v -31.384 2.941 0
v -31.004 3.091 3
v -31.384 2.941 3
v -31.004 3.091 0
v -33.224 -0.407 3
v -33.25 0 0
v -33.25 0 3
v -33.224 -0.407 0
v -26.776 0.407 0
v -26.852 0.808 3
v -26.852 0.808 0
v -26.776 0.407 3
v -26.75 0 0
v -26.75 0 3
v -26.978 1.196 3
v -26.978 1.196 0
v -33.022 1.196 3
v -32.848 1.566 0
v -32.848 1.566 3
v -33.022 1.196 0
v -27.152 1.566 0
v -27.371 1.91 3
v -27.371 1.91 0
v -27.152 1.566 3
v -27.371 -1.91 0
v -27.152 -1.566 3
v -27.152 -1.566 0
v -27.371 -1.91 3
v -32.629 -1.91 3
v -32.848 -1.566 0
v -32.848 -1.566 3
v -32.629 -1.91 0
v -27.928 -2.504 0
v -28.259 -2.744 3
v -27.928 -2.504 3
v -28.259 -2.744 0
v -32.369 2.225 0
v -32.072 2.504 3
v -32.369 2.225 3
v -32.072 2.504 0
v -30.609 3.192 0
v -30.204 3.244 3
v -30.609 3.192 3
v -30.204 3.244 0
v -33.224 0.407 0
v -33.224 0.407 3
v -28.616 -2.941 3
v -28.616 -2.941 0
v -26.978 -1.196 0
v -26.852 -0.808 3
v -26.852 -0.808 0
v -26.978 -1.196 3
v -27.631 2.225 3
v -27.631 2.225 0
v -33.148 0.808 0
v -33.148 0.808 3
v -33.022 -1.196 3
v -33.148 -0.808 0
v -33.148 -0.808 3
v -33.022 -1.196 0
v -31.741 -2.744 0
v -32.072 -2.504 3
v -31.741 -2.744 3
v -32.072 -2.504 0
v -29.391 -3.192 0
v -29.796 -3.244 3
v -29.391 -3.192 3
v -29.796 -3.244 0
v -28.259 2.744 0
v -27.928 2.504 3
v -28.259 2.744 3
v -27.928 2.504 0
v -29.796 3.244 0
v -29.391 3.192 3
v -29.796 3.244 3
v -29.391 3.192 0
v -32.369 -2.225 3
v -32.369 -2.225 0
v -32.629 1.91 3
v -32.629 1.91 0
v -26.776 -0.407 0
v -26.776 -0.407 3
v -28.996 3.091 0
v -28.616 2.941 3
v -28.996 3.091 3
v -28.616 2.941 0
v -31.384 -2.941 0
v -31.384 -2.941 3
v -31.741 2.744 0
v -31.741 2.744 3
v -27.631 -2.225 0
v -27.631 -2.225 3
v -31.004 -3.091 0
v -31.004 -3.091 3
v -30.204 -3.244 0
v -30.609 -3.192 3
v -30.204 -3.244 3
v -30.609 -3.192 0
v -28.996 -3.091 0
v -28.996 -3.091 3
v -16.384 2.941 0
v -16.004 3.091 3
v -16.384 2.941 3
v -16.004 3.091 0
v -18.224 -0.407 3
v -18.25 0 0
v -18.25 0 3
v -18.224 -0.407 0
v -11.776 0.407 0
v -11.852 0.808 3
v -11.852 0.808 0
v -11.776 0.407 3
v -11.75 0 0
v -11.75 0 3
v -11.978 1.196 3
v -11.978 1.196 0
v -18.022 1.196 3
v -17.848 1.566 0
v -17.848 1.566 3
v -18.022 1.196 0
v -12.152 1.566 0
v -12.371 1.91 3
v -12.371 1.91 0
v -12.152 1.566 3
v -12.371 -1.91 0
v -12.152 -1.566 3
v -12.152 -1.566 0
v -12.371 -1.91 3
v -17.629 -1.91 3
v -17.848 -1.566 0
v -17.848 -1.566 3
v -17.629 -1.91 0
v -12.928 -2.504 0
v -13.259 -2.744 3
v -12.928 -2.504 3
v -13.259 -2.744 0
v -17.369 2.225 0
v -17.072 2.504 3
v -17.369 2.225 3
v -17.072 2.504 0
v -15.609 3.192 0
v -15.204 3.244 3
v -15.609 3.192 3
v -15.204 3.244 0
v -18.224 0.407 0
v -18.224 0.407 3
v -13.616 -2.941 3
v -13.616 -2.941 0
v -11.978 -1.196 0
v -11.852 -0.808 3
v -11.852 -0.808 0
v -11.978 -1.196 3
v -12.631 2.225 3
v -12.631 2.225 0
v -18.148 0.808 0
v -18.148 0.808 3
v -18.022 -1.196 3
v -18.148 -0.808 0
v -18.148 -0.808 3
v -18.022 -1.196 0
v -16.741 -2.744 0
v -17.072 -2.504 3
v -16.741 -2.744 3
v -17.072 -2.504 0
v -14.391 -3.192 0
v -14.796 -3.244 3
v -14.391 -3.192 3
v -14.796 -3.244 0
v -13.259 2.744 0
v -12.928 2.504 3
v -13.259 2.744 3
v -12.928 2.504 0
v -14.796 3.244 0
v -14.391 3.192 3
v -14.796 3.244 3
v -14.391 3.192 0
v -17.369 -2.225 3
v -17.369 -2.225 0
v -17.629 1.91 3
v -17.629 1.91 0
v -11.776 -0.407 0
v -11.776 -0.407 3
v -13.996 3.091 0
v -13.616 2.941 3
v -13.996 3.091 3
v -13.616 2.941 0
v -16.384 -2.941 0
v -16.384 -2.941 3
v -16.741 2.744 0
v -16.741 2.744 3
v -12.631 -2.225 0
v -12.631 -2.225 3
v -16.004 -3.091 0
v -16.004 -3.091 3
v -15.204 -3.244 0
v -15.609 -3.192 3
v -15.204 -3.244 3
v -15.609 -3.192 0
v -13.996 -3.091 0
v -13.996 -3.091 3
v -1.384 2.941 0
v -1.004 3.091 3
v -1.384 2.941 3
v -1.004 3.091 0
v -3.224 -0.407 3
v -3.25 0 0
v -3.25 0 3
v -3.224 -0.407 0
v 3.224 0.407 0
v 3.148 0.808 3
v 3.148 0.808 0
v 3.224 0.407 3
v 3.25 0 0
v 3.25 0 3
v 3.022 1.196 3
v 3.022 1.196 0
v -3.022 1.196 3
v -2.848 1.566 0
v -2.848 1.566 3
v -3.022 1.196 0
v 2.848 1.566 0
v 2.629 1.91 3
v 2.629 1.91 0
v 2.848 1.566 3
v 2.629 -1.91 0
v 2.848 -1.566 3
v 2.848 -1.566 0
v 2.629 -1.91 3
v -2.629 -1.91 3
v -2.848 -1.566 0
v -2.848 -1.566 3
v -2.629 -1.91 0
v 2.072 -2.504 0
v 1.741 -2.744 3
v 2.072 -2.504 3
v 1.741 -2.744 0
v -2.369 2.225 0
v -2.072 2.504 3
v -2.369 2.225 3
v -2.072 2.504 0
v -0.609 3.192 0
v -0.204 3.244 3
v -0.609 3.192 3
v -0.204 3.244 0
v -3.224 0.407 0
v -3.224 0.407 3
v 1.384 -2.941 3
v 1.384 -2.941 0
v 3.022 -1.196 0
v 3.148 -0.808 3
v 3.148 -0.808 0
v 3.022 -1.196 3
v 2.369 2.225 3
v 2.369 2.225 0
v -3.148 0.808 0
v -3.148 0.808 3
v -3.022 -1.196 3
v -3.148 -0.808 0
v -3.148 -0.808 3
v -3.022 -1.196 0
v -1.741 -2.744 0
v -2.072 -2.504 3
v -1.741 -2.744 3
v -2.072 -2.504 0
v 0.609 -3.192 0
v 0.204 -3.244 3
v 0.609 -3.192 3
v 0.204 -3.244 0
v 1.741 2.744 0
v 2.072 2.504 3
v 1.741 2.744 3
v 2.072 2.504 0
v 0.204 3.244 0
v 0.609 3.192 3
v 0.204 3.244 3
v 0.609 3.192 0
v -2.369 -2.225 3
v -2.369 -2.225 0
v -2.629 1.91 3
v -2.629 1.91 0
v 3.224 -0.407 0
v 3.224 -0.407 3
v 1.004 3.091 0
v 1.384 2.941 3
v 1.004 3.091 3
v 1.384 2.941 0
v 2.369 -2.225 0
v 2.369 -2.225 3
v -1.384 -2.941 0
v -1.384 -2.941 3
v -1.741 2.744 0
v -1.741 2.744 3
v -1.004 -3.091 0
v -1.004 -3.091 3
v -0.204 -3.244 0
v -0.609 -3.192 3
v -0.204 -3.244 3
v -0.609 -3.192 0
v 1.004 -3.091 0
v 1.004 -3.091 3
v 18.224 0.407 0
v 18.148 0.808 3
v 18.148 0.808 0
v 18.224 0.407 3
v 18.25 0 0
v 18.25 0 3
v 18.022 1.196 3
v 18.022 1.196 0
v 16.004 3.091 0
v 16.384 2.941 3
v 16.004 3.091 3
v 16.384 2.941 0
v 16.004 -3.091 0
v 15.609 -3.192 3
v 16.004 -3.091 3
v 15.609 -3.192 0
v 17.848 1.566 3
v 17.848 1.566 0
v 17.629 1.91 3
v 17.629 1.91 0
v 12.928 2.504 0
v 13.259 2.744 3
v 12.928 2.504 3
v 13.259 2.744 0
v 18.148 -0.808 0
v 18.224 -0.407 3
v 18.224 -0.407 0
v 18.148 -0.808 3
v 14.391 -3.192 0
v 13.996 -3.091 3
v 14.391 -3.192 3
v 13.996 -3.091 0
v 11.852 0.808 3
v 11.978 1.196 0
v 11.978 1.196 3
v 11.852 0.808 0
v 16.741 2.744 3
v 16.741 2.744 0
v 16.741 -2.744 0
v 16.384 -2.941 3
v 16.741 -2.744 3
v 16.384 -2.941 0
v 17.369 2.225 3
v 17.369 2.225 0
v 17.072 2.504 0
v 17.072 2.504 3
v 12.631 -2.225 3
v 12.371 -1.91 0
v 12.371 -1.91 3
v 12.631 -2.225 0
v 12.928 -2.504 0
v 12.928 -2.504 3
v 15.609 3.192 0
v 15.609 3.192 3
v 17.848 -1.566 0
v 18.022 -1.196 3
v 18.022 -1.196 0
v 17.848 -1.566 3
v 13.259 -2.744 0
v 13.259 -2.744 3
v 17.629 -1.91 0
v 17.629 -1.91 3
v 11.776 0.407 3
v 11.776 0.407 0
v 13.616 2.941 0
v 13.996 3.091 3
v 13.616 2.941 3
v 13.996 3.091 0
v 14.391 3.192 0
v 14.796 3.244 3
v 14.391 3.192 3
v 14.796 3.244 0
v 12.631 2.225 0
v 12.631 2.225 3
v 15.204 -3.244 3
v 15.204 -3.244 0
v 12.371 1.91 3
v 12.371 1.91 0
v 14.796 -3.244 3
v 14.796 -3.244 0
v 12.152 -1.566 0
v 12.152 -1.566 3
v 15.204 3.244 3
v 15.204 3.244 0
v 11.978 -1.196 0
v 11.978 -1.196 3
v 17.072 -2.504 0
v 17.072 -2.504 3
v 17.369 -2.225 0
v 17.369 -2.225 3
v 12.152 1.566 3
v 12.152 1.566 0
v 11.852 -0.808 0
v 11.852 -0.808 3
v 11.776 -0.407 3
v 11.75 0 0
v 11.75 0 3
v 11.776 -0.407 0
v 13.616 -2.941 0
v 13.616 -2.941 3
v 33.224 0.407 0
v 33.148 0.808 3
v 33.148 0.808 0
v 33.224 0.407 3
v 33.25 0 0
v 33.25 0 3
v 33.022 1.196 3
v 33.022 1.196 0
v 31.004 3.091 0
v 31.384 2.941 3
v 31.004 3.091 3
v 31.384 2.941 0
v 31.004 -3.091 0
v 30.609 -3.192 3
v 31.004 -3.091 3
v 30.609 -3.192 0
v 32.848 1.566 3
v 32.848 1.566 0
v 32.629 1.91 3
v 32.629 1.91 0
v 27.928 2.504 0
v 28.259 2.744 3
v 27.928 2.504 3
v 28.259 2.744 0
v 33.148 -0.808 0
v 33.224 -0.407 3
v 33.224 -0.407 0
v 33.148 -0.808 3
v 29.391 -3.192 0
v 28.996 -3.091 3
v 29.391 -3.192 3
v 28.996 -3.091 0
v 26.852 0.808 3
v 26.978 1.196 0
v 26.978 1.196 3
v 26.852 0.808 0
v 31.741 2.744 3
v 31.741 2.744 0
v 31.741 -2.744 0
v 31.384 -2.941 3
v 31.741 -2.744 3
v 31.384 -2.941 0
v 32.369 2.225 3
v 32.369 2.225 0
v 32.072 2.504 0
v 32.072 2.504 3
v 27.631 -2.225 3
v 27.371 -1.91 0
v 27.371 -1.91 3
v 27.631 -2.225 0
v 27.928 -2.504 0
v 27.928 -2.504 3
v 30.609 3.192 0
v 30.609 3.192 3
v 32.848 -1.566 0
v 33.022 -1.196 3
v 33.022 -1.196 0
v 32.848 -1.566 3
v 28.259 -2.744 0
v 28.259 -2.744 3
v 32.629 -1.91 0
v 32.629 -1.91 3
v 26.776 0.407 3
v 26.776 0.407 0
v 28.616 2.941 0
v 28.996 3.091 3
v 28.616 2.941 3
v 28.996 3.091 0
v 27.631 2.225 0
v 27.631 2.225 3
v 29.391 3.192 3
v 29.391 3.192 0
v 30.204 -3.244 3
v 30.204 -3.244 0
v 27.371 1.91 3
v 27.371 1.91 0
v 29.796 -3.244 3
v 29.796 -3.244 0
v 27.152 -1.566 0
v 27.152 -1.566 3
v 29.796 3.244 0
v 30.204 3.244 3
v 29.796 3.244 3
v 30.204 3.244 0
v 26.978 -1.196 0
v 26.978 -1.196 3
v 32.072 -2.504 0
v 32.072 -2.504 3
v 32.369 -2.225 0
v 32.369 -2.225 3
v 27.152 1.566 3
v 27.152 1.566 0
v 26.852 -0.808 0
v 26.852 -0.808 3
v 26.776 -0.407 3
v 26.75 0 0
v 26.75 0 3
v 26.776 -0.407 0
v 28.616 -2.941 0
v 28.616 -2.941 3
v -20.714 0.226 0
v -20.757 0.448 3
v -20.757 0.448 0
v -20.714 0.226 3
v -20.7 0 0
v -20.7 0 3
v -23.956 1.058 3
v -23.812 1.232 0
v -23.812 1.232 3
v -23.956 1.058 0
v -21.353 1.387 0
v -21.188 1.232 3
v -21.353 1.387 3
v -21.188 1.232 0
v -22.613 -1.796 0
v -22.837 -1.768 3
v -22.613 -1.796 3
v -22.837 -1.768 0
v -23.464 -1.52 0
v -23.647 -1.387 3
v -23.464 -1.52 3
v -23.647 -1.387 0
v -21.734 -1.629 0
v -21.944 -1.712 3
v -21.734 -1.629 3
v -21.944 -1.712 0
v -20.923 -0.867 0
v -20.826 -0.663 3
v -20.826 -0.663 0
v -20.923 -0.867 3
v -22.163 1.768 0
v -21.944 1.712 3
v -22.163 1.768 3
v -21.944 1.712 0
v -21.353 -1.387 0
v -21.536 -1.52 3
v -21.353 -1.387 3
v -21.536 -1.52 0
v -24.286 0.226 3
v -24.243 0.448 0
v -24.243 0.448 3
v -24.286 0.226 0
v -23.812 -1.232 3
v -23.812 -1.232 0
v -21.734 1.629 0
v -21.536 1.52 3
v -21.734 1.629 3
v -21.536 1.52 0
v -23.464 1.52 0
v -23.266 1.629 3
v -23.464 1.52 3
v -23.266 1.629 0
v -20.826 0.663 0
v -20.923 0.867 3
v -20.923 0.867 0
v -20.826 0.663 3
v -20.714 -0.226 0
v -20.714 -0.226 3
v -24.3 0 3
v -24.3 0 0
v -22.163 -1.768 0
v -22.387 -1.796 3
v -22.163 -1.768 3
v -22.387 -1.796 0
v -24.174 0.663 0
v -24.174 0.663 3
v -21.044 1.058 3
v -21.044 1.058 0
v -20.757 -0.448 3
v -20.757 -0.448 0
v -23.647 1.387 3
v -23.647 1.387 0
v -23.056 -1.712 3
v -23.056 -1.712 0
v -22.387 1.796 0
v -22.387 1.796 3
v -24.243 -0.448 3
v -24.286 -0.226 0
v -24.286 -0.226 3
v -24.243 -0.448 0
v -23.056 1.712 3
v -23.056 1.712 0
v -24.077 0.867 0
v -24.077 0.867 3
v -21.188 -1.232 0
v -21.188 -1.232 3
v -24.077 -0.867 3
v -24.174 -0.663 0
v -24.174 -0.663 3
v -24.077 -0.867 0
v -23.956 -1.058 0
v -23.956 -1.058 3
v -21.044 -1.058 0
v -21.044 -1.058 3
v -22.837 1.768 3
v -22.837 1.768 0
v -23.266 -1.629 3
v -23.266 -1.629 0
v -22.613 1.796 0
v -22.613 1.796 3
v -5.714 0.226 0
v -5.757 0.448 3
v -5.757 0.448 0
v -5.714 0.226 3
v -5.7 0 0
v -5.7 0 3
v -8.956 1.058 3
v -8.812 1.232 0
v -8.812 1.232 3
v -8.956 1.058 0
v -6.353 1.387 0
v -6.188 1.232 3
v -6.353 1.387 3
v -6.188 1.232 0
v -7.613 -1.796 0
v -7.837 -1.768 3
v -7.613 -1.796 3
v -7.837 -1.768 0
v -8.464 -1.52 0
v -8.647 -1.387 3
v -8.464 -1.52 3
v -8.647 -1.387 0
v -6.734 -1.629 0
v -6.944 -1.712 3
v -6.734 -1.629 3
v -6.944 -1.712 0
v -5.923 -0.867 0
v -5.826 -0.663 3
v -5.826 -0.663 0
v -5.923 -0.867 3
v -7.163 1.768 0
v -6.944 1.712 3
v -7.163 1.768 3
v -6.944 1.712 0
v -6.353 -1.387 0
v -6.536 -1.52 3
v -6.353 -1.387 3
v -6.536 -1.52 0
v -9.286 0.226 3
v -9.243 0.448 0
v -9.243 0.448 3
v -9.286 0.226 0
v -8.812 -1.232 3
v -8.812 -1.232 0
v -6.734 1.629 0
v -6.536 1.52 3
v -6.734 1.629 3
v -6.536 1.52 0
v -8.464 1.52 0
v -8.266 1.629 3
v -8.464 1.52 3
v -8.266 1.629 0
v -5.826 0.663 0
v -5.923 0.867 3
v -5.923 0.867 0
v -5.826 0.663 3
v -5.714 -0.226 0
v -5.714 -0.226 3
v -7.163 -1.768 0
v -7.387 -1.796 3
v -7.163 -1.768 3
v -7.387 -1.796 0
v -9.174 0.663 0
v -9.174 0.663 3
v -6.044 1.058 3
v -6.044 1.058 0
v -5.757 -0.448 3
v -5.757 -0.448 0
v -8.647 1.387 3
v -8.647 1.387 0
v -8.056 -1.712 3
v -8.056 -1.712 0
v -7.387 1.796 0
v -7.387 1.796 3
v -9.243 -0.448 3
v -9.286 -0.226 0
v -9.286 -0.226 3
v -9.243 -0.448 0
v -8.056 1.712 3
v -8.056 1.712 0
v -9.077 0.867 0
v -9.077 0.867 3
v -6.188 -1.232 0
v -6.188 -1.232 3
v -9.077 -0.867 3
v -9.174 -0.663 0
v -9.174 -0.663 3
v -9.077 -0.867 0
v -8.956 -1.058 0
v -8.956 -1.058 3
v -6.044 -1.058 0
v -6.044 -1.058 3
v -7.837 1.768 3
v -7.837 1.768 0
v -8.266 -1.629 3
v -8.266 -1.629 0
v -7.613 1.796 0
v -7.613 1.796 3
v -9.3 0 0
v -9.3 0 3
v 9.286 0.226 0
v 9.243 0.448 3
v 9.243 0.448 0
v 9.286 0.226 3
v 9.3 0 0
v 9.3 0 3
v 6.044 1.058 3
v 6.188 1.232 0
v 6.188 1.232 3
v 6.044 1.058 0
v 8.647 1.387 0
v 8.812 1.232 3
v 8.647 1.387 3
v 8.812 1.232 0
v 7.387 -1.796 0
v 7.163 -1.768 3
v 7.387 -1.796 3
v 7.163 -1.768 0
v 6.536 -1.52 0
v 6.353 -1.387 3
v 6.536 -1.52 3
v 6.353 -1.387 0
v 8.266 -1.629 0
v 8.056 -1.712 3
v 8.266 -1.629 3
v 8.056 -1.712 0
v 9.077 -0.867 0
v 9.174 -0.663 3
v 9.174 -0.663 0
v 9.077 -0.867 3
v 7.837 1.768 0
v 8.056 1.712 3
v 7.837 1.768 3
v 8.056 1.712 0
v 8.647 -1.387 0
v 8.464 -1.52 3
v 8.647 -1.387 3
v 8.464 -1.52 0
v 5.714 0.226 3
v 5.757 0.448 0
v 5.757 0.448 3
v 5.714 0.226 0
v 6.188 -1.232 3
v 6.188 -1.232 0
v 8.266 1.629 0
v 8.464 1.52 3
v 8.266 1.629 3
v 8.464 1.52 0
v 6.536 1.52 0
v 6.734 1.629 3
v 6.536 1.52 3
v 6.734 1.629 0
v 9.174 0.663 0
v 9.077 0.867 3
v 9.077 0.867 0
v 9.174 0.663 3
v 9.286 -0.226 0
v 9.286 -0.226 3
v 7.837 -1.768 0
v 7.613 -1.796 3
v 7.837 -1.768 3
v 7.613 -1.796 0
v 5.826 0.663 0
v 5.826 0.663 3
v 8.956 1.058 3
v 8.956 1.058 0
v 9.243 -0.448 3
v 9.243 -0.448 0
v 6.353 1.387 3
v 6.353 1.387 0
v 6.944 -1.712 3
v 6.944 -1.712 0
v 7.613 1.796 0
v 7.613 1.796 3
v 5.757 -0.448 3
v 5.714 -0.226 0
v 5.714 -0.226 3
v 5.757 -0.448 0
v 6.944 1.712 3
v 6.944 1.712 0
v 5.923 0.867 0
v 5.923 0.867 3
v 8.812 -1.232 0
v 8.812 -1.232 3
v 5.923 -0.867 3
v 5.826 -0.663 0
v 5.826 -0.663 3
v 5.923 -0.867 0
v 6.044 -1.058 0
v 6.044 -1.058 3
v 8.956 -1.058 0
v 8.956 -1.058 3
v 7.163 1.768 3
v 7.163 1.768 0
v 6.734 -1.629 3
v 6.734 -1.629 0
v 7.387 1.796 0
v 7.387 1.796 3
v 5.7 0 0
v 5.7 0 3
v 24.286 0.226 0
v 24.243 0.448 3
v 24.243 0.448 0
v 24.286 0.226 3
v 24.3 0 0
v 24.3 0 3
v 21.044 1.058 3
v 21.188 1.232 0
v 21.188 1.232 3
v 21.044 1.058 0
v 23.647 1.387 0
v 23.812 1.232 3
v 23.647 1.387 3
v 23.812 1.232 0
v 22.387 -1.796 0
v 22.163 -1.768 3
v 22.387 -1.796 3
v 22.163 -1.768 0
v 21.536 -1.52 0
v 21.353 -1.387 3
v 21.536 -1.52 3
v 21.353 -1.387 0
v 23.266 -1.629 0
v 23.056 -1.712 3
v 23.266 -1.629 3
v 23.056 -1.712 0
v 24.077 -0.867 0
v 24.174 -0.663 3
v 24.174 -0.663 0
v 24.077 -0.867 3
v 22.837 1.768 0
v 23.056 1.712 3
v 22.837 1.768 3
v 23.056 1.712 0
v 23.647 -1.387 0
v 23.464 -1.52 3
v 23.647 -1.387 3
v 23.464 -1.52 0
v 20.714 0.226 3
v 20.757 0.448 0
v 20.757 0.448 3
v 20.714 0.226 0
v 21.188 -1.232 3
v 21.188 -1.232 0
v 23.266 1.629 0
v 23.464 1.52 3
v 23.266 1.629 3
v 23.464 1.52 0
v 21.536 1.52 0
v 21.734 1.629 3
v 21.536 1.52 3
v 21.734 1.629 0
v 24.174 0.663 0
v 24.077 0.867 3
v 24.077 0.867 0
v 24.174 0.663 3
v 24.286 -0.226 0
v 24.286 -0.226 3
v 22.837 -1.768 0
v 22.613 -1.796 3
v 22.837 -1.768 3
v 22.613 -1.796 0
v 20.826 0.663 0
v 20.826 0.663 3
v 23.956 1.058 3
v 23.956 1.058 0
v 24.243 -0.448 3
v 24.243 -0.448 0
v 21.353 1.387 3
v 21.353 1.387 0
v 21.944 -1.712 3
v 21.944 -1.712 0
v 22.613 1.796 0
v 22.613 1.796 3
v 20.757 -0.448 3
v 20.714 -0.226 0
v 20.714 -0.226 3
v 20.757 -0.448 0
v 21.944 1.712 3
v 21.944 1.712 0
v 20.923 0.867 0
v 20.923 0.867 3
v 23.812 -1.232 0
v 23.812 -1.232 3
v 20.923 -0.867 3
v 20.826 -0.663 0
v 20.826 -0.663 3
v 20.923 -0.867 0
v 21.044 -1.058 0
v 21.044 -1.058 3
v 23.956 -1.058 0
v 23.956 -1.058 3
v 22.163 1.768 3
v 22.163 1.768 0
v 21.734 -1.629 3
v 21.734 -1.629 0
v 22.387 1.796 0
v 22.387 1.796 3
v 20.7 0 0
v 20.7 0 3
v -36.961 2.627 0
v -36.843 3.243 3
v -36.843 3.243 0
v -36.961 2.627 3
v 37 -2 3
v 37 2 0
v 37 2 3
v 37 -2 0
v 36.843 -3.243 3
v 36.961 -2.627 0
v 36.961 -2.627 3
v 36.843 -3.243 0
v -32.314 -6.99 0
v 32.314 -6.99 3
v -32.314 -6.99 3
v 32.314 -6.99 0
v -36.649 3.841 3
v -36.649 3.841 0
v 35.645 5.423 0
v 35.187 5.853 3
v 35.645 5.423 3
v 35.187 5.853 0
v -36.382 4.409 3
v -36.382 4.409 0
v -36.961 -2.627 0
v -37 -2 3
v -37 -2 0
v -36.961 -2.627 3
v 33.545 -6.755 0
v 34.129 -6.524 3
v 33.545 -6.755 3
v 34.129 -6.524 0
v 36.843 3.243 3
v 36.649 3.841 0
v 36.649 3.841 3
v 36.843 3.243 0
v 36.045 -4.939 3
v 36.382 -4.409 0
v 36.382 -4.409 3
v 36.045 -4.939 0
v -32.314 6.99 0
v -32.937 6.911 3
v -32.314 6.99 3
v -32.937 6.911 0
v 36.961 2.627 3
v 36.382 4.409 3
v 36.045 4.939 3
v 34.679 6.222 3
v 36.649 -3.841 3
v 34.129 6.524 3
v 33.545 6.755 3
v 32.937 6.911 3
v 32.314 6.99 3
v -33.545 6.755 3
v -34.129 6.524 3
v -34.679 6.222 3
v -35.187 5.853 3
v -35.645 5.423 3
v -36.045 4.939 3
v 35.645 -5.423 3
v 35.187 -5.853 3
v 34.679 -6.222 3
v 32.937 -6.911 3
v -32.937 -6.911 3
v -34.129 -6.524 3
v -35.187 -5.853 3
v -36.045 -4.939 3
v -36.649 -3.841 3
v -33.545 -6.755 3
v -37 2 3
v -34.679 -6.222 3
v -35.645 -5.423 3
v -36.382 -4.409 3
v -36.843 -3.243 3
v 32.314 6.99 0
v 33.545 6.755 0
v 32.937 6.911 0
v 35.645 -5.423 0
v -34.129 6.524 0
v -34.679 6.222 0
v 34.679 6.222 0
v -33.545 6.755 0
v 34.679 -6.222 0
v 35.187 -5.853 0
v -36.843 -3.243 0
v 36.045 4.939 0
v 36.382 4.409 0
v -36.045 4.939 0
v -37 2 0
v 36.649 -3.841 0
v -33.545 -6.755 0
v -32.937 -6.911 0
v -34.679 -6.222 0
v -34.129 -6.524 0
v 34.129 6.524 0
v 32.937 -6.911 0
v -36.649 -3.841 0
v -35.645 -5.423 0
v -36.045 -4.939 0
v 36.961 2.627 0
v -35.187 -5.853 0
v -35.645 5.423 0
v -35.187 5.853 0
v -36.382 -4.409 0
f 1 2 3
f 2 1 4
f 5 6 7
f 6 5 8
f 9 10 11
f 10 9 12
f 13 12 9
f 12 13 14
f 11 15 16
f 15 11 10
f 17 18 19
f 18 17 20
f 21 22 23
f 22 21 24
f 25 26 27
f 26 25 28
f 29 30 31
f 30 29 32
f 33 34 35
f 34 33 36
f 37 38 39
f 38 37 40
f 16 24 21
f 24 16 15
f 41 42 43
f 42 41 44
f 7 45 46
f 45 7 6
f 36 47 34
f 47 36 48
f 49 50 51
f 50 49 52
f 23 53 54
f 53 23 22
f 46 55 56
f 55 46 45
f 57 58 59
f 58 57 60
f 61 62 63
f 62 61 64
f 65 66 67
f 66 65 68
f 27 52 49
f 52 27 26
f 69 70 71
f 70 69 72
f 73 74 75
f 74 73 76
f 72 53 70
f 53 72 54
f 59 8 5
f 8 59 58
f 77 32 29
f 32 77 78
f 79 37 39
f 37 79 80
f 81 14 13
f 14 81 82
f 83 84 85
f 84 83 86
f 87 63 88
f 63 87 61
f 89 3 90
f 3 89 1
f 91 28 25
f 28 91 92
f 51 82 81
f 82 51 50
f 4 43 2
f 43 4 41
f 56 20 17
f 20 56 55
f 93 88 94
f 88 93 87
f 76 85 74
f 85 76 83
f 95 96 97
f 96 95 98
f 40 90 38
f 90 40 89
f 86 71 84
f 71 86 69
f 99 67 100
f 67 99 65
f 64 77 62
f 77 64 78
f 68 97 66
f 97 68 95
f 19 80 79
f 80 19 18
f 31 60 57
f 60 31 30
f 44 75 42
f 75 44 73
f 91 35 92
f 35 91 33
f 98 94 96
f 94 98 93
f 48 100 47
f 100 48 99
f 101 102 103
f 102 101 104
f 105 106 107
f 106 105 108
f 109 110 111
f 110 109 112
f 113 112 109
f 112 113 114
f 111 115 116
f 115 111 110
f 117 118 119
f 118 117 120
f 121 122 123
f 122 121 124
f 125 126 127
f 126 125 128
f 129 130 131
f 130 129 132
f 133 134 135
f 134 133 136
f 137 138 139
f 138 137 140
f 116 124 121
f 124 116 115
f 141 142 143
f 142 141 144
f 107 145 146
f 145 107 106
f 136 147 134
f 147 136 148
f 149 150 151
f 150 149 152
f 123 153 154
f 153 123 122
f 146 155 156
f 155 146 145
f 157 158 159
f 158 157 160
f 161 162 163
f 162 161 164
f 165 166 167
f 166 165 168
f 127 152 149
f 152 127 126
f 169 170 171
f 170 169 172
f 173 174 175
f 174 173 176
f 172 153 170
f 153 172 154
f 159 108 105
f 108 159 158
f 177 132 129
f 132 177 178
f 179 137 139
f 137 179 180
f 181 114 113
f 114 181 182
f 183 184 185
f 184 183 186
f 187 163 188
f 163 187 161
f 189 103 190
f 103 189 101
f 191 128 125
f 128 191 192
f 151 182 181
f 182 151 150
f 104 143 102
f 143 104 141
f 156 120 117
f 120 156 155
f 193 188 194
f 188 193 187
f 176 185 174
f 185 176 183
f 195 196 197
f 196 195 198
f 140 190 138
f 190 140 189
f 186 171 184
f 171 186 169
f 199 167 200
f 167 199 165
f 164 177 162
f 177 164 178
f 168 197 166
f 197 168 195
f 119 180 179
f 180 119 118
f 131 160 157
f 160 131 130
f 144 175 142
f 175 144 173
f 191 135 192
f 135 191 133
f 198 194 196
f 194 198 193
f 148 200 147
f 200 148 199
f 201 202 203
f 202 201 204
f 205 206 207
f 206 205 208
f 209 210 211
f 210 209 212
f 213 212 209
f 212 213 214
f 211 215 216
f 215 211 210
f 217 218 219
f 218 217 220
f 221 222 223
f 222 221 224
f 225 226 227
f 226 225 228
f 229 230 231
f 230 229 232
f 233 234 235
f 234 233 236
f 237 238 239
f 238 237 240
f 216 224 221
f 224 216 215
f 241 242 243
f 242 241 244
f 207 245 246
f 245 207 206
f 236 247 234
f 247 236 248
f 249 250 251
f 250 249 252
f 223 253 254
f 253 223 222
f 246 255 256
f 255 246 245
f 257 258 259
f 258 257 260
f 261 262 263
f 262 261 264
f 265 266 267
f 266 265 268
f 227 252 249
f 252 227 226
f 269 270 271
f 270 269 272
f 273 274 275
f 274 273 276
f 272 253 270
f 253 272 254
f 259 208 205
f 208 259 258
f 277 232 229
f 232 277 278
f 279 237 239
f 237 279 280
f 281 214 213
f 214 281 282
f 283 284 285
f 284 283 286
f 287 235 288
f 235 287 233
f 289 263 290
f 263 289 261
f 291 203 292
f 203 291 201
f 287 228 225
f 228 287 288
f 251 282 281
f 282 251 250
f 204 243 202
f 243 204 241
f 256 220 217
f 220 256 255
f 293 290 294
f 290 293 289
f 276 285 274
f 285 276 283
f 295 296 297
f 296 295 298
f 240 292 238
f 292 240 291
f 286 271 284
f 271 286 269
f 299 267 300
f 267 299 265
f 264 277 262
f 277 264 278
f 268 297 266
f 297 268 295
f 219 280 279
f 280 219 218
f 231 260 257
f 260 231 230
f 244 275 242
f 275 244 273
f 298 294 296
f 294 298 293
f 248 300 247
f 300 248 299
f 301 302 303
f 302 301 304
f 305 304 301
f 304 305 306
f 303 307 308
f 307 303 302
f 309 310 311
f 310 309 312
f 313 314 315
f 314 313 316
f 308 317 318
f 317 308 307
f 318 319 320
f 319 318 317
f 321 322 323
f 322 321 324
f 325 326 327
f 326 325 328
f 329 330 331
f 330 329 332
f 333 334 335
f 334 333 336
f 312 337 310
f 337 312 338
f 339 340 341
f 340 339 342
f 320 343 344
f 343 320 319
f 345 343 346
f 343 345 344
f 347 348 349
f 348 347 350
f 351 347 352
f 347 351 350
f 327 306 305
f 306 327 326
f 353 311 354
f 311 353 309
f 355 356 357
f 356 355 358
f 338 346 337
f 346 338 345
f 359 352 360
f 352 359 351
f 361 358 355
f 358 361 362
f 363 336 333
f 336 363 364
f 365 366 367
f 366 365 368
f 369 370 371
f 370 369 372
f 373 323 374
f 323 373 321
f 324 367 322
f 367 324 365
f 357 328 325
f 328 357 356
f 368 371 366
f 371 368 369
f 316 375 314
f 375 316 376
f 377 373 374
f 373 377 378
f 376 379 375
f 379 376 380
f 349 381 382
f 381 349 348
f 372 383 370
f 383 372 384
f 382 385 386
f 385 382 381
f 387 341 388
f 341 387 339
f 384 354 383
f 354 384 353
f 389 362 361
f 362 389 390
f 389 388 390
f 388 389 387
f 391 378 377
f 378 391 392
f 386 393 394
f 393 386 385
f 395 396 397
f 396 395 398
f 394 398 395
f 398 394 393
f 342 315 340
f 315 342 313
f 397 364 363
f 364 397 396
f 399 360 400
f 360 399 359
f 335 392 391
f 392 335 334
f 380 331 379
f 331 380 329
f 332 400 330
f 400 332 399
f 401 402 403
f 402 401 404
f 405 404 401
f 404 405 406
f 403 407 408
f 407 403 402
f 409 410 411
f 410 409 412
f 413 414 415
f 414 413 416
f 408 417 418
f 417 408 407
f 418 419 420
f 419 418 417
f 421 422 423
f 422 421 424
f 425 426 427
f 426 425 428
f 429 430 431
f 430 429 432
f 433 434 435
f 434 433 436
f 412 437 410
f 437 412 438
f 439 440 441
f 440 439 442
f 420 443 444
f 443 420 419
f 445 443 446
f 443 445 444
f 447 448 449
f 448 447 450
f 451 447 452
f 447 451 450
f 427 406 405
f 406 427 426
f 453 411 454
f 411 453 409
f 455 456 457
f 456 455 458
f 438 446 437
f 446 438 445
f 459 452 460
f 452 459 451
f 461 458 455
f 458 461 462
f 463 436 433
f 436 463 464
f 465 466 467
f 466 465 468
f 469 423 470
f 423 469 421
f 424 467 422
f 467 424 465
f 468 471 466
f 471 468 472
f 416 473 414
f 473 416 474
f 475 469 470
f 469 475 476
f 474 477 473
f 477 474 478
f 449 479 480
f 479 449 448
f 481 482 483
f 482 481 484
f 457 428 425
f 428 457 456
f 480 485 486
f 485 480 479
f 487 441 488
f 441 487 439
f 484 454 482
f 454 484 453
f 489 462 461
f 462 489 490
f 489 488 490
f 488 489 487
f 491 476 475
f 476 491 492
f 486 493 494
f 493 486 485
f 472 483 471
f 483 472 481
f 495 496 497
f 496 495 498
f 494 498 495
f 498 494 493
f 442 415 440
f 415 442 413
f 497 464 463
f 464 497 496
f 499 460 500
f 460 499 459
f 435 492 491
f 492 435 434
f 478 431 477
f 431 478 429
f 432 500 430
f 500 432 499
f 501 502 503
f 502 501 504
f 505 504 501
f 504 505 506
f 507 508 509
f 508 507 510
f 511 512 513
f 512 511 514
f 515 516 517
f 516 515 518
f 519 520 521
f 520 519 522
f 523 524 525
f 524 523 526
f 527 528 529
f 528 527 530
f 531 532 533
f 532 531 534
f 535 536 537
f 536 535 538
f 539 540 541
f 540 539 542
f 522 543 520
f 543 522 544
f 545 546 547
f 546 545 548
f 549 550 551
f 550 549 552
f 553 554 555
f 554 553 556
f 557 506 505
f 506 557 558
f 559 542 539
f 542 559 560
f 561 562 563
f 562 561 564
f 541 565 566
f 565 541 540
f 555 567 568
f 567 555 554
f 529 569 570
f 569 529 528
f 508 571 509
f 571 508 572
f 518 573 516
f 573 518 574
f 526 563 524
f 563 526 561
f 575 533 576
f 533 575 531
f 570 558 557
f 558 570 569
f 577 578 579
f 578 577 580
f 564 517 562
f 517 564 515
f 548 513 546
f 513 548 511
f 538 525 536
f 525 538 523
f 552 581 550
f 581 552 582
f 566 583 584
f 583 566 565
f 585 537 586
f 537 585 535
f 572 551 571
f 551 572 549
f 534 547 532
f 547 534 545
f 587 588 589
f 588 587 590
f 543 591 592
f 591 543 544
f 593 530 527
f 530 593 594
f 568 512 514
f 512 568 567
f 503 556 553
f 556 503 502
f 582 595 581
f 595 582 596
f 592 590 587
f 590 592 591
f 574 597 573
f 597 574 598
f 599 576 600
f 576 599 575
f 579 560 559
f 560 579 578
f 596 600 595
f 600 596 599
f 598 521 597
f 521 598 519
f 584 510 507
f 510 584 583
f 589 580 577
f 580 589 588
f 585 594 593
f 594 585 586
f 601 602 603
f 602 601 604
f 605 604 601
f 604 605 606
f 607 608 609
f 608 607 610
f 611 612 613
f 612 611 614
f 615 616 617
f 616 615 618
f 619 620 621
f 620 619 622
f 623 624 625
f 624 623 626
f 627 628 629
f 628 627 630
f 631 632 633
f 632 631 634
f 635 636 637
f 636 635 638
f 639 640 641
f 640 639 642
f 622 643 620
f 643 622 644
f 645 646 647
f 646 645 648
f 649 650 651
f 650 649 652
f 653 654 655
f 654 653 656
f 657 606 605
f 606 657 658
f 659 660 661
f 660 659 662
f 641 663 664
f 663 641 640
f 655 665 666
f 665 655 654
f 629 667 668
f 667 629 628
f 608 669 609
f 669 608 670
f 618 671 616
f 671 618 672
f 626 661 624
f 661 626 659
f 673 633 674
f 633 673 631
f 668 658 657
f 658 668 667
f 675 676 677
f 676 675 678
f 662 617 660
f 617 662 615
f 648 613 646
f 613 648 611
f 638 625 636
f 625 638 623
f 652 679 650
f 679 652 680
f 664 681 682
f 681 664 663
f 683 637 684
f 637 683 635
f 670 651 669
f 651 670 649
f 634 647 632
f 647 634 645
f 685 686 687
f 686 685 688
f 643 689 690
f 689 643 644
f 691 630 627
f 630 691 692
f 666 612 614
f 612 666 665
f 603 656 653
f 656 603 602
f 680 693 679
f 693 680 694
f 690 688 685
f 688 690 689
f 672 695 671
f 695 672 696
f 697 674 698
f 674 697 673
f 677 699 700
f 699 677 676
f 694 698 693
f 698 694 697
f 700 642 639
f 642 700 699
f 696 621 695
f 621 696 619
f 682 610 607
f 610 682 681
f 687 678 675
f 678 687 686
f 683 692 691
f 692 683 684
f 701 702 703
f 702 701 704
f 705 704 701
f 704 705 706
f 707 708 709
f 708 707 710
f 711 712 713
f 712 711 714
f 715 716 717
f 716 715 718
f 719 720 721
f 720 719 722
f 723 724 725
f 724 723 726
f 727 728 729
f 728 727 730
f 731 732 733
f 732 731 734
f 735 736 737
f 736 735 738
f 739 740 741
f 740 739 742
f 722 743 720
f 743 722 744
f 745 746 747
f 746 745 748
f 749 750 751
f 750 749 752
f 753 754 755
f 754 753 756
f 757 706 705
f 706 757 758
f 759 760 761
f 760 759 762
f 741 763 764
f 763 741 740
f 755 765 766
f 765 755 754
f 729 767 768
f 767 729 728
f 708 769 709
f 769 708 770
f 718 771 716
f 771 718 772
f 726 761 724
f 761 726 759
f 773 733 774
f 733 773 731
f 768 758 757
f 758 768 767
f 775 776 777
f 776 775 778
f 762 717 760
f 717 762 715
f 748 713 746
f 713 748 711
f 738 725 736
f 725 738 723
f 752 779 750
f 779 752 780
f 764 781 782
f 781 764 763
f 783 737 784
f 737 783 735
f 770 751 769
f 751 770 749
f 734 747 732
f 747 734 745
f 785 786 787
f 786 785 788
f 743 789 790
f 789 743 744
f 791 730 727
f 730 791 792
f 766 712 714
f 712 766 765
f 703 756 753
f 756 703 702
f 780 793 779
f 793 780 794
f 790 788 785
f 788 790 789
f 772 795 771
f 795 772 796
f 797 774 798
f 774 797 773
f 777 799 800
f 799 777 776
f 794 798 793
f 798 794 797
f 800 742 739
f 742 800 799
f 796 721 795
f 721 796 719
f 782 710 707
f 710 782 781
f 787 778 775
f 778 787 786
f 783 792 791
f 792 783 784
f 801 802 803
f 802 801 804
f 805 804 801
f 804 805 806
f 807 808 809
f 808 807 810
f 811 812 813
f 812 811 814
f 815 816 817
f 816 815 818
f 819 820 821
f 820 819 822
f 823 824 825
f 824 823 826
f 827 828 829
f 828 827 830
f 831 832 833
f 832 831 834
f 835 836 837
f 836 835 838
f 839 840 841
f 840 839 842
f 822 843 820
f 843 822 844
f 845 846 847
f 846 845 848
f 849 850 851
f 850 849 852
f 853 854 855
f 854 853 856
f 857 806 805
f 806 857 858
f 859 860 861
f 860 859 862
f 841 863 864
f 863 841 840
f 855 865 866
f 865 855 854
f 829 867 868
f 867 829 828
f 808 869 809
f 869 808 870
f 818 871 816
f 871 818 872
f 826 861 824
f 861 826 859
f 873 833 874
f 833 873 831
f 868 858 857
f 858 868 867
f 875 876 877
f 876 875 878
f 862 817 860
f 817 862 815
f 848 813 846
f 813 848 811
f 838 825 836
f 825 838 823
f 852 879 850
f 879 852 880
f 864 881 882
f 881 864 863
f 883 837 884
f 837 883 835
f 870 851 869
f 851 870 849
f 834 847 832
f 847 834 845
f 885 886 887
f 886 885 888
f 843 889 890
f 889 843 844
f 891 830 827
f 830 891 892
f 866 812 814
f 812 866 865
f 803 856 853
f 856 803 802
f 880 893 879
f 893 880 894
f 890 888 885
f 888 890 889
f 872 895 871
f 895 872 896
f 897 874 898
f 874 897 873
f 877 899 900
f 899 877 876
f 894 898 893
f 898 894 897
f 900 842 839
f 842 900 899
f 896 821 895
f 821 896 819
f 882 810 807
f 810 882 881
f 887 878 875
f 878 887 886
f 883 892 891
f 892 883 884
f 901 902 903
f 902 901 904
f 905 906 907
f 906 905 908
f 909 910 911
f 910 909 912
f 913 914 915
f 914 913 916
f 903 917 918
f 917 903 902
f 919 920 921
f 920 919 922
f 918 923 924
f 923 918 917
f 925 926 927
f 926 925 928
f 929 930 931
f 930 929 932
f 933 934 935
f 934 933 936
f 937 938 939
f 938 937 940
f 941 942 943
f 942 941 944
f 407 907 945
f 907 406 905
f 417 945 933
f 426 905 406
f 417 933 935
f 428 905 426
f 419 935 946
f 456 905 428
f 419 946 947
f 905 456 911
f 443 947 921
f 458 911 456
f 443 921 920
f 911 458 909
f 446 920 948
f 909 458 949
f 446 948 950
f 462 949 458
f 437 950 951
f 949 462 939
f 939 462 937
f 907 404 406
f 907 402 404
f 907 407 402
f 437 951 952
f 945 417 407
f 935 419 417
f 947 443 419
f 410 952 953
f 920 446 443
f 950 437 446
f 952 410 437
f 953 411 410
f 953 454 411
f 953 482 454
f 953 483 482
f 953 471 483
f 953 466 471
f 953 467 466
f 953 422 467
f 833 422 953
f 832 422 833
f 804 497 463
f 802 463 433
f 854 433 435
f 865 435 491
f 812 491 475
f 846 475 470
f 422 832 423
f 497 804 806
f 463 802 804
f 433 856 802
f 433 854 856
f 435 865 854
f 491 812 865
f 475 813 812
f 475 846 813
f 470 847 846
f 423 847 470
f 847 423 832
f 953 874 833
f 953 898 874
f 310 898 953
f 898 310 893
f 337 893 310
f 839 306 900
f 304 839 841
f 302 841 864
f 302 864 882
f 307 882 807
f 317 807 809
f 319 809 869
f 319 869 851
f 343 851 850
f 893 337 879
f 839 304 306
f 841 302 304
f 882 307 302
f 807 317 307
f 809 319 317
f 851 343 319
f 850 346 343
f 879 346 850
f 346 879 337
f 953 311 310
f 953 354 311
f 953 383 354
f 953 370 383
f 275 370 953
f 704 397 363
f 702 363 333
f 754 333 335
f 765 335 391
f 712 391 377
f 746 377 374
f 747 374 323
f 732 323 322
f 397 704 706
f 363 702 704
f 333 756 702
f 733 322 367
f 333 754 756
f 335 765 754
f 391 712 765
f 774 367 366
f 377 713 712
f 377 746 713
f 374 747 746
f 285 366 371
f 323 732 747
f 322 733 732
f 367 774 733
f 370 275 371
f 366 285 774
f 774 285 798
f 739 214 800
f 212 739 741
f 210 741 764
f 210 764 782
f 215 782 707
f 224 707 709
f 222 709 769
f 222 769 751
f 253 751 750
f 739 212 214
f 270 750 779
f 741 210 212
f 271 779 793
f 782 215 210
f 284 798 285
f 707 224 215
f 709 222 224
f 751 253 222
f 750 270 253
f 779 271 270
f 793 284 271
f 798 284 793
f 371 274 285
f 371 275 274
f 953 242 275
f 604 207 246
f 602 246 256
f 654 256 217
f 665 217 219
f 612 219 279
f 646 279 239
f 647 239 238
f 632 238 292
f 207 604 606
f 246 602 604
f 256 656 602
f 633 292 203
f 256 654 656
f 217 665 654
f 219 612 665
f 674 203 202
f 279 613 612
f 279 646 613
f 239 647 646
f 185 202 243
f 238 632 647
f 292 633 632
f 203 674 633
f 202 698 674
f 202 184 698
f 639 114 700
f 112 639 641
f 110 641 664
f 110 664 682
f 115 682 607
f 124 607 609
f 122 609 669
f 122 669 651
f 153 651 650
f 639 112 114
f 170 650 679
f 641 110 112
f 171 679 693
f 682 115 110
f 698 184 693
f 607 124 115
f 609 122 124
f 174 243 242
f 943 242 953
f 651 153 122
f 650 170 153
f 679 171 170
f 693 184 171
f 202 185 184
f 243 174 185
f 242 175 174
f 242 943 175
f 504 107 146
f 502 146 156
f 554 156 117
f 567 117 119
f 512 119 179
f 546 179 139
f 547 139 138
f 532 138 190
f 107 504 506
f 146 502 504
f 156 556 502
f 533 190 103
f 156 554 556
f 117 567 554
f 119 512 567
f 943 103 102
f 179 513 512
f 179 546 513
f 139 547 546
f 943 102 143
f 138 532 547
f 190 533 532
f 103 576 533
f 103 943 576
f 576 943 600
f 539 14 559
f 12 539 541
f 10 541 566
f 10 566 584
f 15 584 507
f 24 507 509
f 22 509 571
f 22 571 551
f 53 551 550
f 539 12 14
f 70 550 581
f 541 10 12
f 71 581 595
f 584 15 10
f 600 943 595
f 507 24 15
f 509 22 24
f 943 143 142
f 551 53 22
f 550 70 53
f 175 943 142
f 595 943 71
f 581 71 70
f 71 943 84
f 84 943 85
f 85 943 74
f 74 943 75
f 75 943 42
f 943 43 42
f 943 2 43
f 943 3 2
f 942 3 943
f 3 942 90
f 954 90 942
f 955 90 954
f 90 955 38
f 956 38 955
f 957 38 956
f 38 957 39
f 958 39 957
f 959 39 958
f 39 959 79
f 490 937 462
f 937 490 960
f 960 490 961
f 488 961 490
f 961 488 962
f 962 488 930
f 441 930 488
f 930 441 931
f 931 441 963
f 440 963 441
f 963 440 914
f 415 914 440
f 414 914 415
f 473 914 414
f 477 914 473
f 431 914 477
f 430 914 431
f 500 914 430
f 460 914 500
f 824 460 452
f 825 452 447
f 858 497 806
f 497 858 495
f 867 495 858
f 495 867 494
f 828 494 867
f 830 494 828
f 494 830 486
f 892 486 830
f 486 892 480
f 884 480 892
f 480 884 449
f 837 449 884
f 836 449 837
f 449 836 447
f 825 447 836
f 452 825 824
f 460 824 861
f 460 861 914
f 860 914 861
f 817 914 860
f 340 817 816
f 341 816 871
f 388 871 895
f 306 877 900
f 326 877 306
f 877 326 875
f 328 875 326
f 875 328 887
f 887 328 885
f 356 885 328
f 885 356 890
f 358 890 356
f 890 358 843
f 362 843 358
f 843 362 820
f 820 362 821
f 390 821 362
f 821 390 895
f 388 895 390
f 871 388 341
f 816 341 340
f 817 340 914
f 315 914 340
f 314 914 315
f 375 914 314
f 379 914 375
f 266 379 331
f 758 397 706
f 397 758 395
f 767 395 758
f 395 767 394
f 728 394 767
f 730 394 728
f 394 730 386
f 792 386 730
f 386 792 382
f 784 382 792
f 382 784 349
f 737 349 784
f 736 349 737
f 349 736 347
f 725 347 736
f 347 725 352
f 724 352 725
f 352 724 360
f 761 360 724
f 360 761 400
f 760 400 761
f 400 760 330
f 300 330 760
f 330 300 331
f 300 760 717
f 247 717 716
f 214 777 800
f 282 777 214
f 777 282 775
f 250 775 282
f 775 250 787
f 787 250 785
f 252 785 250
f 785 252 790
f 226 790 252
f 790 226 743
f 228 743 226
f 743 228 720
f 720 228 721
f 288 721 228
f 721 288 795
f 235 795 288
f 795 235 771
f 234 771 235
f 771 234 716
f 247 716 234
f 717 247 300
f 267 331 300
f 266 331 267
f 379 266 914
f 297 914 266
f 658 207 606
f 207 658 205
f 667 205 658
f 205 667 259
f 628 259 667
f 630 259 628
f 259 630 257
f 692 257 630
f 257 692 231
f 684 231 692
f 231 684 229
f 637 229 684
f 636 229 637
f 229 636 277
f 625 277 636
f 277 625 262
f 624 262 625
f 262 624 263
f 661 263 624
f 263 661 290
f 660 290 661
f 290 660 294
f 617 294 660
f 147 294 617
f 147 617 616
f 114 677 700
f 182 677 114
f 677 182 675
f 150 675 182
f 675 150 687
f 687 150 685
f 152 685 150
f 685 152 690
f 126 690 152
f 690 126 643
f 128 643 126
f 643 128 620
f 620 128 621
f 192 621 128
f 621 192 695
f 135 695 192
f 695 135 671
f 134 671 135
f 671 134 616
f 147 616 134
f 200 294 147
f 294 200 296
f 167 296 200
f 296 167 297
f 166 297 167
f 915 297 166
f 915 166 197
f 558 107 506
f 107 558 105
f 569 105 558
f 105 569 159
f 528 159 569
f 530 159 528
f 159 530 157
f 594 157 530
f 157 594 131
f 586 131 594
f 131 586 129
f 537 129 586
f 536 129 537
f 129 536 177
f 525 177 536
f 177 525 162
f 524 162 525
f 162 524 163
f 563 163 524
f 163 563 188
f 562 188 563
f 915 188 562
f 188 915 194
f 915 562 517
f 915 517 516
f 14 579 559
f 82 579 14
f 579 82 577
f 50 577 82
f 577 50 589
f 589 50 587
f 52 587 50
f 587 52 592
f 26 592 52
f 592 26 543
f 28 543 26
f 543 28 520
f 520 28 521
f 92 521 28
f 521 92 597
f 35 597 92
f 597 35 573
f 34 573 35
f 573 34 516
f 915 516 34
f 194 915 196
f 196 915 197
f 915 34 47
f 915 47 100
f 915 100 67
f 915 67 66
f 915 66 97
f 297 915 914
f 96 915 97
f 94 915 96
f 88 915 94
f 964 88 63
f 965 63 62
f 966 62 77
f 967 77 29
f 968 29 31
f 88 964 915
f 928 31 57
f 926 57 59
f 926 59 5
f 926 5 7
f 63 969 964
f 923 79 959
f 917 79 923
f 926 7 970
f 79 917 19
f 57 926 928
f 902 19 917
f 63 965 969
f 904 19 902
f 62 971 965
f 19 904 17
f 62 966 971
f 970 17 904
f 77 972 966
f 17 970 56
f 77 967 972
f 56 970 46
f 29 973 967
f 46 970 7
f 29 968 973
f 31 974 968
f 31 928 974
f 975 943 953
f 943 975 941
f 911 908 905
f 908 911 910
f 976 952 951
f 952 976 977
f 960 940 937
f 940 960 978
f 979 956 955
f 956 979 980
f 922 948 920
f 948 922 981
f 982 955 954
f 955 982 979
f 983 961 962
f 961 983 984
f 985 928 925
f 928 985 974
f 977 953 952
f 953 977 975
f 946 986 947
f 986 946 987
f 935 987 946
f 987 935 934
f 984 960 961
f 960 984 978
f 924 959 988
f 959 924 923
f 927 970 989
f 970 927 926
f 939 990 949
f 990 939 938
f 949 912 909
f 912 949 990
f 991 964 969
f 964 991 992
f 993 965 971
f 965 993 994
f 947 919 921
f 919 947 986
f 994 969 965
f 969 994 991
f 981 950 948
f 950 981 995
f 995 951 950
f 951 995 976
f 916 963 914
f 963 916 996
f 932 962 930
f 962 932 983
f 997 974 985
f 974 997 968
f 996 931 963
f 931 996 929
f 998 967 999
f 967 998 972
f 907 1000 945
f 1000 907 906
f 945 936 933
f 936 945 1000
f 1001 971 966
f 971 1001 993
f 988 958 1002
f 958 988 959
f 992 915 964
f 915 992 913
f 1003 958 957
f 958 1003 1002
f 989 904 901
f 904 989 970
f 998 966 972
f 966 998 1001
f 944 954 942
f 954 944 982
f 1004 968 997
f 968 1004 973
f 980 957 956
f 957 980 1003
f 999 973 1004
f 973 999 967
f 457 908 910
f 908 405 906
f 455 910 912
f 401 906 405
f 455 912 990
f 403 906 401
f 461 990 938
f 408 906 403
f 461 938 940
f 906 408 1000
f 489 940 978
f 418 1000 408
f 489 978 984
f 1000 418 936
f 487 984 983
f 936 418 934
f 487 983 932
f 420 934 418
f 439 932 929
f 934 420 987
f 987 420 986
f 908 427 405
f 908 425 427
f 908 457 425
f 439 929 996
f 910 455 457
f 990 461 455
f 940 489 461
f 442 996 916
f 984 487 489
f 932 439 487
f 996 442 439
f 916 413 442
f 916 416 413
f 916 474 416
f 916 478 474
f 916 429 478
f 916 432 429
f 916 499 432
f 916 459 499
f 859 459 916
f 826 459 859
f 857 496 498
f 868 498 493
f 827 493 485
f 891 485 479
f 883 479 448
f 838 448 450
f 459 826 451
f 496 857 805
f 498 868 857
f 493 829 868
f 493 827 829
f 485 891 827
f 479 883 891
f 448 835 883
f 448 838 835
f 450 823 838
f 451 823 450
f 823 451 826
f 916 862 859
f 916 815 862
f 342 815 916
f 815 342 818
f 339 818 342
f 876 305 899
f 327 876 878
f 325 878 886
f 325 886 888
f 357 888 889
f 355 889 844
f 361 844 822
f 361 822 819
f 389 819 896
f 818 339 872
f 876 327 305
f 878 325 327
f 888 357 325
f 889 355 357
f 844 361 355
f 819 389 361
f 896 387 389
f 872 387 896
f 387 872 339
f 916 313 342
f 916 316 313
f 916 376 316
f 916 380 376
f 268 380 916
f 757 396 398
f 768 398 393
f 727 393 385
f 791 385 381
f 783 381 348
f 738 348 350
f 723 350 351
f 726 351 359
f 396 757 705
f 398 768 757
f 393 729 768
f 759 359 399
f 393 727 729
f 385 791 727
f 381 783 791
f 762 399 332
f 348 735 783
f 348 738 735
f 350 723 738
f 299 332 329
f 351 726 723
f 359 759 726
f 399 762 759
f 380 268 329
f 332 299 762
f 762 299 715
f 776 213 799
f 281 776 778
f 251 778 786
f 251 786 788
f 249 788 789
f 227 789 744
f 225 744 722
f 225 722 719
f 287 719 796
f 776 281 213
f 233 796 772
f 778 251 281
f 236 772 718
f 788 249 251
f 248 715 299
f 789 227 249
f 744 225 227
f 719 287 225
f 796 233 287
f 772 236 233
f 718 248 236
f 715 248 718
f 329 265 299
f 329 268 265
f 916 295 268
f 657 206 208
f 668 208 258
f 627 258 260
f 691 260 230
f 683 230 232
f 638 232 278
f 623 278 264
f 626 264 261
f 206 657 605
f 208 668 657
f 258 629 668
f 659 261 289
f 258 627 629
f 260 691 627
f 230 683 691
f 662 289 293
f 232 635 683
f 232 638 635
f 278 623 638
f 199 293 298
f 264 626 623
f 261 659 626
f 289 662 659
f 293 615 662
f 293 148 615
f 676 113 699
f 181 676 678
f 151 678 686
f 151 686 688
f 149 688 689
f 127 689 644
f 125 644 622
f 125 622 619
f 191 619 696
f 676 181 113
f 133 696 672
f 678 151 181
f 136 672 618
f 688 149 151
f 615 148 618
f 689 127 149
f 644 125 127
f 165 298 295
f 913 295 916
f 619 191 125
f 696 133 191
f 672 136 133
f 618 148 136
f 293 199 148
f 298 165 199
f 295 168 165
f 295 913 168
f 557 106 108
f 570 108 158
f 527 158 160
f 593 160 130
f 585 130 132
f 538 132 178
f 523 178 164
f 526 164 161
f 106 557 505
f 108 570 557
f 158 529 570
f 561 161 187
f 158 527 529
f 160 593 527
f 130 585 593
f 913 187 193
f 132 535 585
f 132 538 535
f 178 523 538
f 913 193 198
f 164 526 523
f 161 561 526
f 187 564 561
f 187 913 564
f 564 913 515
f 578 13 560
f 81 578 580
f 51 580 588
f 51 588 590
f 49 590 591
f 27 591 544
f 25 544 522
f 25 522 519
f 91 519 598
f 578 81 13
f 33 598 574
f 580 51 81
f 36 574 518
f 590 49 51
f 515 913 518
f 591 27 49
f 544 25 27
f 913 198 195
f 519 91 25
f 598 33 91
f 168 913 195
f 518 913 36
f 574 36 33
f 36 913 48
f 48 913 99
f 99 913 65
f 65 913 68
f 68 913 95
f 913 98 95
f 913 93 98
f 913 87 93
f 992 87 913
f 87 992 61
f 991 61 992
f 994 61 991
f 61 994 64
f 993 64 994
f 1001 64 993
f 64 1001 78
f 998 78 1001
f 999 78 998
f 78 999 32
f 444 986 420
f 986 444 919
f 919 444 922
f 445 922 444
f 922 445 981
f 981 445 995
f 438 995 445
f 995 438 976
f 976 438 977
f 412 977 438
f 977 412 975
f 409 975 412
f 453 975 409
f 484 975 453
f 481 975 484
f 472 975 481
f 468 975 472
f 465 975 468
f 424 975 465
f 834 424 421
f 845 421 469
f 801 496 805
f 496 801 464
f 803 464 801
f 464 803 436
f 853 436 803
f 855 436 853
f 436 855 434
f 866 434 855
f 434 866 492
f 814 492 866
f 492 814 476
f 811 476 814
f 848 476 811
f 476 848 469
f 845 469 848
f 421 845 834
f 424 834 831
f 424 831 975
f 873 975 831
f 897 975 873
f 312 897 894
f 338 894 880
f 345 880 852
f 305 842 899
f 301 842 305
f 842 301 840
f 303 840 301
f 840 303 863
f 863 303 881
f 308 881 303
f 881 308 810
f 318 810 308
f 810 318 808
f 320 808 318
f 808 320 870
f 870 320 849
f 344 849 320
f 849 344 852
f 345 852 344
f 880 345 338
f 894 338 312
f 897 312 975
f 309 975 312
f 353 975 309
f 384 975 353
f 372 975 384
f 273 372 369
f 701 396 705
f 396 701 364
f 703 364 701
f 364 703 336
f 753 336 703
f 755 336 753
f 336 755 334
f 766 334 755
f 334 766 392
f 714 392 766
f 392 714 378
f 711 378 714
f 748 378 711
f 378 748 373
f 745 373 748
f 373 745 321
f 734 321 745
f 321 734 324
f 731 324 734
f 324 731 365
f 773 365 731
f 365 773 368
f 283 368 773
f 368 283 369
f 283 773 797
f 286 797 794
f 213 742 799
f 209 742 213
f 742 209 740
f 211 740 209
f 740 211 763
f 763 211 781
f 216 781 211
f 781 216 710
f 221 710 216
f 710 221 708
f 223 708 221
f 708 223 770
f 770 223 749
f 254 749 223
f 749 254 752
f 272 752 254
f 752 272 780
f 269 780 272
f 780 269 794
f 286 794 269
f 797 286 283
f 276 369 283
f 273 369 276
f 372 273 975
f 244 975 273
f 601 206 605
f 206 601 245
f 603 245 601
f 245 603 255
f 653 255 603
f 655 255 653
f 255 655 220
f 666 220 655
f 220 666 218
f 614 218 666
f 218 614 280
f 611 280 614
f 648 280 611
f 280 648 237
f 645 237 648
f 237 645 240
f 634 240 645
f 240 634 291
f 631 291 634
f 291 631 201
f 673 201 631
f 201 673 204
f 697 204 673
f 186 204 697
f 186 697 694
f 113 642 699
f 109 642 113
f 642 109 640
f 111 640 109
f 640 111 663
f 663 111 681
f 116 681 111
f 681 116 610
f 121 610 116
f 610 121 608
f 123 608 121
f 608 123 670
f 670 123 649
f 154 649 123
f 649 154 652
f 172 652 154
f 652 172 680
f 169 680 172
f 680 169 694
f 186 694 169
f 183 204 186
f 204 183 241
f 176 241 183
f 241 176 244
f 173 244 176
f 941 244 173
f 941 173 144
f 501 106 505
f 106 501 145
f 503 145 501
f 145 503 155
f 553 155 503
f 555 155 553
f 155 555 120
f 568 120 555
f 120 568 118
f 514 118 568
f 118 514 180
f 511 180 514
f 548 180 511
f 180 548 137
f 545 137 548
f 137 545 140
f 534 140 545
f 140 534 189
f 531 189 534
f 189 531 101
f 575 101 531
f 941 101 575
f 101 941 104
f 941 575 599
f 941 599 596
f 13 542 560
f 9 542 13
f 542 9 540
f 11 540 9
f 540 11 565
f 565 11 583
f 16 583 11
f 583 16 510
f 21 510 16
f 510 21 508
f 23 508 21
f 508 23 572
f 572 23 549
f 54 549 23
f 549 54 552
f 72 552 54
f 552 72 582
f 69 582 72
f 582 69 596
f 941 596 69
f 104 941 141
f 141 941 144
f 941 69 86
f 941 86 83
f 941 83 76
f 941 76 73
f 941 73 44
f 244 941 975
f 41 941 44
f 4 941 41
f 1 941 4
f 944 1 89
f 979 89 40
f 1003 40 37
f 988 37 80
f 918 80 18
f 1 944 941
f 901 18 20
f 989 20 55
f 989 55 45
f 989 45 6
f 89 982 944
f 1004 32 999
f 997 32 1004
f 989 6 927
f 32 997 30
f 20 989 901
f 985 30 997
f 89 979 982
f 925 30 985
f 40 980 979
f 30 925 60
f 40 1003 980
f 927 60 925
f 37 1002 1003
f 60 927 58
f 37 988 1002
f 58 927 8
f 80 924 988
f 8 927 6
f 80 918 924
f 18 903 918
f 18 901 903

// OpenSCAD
$fn = 50;

difference() {
	union() {
		hull() {
			translate(v = [-32.0, 2.0, 0]) {
				cylinder(h = 3, r = 5);
			}
			translate(v = [32.0, 2.0, 0]) {
				cylinder(h = 3, r = 5);
			}
			translate(v = [-32.0, -2.0, 0]) {
				cylinder(h = 3, r = 5);
			}
			translate(v = [32.0, -2.0, 0]) {
				cylinder(h = 3, r = 5);
			}
		}
	}
	union() {
		translate(v = [-30.0, 0.0, 0]) {
			translate(v = [0, 0, -100]) {
				cylinder(h = 200, r = 3.25);
			}
		}
		translate(v = [-15.0, 0.0, 0]) {
			translate(v = [0, 0, -100]) {
				cylinder(h = 200, r = 3.25);
			}
		}
		translate(v = [0, 0, -100]) {
			cylinder(h = 200, r = 3.25);
		}
		translate(v = [15.0, 0.0, 0]) {
			translate(v = [0, 0, -100]) {
				cylinder(h = 200, r = 3.25);
			}
		}
		translate(v = [30.0, 0.0, 0]) {
			translate(v = [0, 0, -100]) {
				cylinder(h = 200, r = 3.25);
			}
		}
		translate(v = [-30.0, 0.0, 0]) {
			translate(v = [0, 0, -100]) {
				cylinder(h = 200, r = 1.8);
			}
		}
		translate(v = [-22.5, 0.0, 0]) {
			translate(v = [0, 0, -100]) {
				cylinder(h = 200, r = 1.8);
			}
		}
		translate(v = [-15.0, 0.0, 0]) {
			translate(v = [0, 0, -100]) {
				cylinder(h = 200, r = 1.8);
			}
		}
		translate(v = [-7.5, 0.0, 0]) {
			translate(v = [0, 0, -100]) {
				cylinder(h = 200, r = 1.8);
			}
		}
		translate(v = [0, 0, -100]) {
			cylinder(h = 200, r = 1.8);
		}
		translate(v = [7.5, 0.0, 0]) {
			translate(v = [0, 0, -100]) {
				cylinder(h = 200, r = 1.8);
			}
		}
		translate(v = [15.0, 0.0, 0]) {
			translate(v = [0, 0, -100]) {
				cylinder(h = 200, r = 1.8);
			}
		}
		translate(v = [22.5, 0.0, 0]) {
			translate(v = [0, 0, -100]) {
				cylinder(h = 200, r = 1.8);
			}
		}
		translate(v = [30.0, 0.0, 0]) {
			translate(v = [0, 0, -100]) {
				cylinder(h = 200, r = 1.8);
			}
		}
	}
}
